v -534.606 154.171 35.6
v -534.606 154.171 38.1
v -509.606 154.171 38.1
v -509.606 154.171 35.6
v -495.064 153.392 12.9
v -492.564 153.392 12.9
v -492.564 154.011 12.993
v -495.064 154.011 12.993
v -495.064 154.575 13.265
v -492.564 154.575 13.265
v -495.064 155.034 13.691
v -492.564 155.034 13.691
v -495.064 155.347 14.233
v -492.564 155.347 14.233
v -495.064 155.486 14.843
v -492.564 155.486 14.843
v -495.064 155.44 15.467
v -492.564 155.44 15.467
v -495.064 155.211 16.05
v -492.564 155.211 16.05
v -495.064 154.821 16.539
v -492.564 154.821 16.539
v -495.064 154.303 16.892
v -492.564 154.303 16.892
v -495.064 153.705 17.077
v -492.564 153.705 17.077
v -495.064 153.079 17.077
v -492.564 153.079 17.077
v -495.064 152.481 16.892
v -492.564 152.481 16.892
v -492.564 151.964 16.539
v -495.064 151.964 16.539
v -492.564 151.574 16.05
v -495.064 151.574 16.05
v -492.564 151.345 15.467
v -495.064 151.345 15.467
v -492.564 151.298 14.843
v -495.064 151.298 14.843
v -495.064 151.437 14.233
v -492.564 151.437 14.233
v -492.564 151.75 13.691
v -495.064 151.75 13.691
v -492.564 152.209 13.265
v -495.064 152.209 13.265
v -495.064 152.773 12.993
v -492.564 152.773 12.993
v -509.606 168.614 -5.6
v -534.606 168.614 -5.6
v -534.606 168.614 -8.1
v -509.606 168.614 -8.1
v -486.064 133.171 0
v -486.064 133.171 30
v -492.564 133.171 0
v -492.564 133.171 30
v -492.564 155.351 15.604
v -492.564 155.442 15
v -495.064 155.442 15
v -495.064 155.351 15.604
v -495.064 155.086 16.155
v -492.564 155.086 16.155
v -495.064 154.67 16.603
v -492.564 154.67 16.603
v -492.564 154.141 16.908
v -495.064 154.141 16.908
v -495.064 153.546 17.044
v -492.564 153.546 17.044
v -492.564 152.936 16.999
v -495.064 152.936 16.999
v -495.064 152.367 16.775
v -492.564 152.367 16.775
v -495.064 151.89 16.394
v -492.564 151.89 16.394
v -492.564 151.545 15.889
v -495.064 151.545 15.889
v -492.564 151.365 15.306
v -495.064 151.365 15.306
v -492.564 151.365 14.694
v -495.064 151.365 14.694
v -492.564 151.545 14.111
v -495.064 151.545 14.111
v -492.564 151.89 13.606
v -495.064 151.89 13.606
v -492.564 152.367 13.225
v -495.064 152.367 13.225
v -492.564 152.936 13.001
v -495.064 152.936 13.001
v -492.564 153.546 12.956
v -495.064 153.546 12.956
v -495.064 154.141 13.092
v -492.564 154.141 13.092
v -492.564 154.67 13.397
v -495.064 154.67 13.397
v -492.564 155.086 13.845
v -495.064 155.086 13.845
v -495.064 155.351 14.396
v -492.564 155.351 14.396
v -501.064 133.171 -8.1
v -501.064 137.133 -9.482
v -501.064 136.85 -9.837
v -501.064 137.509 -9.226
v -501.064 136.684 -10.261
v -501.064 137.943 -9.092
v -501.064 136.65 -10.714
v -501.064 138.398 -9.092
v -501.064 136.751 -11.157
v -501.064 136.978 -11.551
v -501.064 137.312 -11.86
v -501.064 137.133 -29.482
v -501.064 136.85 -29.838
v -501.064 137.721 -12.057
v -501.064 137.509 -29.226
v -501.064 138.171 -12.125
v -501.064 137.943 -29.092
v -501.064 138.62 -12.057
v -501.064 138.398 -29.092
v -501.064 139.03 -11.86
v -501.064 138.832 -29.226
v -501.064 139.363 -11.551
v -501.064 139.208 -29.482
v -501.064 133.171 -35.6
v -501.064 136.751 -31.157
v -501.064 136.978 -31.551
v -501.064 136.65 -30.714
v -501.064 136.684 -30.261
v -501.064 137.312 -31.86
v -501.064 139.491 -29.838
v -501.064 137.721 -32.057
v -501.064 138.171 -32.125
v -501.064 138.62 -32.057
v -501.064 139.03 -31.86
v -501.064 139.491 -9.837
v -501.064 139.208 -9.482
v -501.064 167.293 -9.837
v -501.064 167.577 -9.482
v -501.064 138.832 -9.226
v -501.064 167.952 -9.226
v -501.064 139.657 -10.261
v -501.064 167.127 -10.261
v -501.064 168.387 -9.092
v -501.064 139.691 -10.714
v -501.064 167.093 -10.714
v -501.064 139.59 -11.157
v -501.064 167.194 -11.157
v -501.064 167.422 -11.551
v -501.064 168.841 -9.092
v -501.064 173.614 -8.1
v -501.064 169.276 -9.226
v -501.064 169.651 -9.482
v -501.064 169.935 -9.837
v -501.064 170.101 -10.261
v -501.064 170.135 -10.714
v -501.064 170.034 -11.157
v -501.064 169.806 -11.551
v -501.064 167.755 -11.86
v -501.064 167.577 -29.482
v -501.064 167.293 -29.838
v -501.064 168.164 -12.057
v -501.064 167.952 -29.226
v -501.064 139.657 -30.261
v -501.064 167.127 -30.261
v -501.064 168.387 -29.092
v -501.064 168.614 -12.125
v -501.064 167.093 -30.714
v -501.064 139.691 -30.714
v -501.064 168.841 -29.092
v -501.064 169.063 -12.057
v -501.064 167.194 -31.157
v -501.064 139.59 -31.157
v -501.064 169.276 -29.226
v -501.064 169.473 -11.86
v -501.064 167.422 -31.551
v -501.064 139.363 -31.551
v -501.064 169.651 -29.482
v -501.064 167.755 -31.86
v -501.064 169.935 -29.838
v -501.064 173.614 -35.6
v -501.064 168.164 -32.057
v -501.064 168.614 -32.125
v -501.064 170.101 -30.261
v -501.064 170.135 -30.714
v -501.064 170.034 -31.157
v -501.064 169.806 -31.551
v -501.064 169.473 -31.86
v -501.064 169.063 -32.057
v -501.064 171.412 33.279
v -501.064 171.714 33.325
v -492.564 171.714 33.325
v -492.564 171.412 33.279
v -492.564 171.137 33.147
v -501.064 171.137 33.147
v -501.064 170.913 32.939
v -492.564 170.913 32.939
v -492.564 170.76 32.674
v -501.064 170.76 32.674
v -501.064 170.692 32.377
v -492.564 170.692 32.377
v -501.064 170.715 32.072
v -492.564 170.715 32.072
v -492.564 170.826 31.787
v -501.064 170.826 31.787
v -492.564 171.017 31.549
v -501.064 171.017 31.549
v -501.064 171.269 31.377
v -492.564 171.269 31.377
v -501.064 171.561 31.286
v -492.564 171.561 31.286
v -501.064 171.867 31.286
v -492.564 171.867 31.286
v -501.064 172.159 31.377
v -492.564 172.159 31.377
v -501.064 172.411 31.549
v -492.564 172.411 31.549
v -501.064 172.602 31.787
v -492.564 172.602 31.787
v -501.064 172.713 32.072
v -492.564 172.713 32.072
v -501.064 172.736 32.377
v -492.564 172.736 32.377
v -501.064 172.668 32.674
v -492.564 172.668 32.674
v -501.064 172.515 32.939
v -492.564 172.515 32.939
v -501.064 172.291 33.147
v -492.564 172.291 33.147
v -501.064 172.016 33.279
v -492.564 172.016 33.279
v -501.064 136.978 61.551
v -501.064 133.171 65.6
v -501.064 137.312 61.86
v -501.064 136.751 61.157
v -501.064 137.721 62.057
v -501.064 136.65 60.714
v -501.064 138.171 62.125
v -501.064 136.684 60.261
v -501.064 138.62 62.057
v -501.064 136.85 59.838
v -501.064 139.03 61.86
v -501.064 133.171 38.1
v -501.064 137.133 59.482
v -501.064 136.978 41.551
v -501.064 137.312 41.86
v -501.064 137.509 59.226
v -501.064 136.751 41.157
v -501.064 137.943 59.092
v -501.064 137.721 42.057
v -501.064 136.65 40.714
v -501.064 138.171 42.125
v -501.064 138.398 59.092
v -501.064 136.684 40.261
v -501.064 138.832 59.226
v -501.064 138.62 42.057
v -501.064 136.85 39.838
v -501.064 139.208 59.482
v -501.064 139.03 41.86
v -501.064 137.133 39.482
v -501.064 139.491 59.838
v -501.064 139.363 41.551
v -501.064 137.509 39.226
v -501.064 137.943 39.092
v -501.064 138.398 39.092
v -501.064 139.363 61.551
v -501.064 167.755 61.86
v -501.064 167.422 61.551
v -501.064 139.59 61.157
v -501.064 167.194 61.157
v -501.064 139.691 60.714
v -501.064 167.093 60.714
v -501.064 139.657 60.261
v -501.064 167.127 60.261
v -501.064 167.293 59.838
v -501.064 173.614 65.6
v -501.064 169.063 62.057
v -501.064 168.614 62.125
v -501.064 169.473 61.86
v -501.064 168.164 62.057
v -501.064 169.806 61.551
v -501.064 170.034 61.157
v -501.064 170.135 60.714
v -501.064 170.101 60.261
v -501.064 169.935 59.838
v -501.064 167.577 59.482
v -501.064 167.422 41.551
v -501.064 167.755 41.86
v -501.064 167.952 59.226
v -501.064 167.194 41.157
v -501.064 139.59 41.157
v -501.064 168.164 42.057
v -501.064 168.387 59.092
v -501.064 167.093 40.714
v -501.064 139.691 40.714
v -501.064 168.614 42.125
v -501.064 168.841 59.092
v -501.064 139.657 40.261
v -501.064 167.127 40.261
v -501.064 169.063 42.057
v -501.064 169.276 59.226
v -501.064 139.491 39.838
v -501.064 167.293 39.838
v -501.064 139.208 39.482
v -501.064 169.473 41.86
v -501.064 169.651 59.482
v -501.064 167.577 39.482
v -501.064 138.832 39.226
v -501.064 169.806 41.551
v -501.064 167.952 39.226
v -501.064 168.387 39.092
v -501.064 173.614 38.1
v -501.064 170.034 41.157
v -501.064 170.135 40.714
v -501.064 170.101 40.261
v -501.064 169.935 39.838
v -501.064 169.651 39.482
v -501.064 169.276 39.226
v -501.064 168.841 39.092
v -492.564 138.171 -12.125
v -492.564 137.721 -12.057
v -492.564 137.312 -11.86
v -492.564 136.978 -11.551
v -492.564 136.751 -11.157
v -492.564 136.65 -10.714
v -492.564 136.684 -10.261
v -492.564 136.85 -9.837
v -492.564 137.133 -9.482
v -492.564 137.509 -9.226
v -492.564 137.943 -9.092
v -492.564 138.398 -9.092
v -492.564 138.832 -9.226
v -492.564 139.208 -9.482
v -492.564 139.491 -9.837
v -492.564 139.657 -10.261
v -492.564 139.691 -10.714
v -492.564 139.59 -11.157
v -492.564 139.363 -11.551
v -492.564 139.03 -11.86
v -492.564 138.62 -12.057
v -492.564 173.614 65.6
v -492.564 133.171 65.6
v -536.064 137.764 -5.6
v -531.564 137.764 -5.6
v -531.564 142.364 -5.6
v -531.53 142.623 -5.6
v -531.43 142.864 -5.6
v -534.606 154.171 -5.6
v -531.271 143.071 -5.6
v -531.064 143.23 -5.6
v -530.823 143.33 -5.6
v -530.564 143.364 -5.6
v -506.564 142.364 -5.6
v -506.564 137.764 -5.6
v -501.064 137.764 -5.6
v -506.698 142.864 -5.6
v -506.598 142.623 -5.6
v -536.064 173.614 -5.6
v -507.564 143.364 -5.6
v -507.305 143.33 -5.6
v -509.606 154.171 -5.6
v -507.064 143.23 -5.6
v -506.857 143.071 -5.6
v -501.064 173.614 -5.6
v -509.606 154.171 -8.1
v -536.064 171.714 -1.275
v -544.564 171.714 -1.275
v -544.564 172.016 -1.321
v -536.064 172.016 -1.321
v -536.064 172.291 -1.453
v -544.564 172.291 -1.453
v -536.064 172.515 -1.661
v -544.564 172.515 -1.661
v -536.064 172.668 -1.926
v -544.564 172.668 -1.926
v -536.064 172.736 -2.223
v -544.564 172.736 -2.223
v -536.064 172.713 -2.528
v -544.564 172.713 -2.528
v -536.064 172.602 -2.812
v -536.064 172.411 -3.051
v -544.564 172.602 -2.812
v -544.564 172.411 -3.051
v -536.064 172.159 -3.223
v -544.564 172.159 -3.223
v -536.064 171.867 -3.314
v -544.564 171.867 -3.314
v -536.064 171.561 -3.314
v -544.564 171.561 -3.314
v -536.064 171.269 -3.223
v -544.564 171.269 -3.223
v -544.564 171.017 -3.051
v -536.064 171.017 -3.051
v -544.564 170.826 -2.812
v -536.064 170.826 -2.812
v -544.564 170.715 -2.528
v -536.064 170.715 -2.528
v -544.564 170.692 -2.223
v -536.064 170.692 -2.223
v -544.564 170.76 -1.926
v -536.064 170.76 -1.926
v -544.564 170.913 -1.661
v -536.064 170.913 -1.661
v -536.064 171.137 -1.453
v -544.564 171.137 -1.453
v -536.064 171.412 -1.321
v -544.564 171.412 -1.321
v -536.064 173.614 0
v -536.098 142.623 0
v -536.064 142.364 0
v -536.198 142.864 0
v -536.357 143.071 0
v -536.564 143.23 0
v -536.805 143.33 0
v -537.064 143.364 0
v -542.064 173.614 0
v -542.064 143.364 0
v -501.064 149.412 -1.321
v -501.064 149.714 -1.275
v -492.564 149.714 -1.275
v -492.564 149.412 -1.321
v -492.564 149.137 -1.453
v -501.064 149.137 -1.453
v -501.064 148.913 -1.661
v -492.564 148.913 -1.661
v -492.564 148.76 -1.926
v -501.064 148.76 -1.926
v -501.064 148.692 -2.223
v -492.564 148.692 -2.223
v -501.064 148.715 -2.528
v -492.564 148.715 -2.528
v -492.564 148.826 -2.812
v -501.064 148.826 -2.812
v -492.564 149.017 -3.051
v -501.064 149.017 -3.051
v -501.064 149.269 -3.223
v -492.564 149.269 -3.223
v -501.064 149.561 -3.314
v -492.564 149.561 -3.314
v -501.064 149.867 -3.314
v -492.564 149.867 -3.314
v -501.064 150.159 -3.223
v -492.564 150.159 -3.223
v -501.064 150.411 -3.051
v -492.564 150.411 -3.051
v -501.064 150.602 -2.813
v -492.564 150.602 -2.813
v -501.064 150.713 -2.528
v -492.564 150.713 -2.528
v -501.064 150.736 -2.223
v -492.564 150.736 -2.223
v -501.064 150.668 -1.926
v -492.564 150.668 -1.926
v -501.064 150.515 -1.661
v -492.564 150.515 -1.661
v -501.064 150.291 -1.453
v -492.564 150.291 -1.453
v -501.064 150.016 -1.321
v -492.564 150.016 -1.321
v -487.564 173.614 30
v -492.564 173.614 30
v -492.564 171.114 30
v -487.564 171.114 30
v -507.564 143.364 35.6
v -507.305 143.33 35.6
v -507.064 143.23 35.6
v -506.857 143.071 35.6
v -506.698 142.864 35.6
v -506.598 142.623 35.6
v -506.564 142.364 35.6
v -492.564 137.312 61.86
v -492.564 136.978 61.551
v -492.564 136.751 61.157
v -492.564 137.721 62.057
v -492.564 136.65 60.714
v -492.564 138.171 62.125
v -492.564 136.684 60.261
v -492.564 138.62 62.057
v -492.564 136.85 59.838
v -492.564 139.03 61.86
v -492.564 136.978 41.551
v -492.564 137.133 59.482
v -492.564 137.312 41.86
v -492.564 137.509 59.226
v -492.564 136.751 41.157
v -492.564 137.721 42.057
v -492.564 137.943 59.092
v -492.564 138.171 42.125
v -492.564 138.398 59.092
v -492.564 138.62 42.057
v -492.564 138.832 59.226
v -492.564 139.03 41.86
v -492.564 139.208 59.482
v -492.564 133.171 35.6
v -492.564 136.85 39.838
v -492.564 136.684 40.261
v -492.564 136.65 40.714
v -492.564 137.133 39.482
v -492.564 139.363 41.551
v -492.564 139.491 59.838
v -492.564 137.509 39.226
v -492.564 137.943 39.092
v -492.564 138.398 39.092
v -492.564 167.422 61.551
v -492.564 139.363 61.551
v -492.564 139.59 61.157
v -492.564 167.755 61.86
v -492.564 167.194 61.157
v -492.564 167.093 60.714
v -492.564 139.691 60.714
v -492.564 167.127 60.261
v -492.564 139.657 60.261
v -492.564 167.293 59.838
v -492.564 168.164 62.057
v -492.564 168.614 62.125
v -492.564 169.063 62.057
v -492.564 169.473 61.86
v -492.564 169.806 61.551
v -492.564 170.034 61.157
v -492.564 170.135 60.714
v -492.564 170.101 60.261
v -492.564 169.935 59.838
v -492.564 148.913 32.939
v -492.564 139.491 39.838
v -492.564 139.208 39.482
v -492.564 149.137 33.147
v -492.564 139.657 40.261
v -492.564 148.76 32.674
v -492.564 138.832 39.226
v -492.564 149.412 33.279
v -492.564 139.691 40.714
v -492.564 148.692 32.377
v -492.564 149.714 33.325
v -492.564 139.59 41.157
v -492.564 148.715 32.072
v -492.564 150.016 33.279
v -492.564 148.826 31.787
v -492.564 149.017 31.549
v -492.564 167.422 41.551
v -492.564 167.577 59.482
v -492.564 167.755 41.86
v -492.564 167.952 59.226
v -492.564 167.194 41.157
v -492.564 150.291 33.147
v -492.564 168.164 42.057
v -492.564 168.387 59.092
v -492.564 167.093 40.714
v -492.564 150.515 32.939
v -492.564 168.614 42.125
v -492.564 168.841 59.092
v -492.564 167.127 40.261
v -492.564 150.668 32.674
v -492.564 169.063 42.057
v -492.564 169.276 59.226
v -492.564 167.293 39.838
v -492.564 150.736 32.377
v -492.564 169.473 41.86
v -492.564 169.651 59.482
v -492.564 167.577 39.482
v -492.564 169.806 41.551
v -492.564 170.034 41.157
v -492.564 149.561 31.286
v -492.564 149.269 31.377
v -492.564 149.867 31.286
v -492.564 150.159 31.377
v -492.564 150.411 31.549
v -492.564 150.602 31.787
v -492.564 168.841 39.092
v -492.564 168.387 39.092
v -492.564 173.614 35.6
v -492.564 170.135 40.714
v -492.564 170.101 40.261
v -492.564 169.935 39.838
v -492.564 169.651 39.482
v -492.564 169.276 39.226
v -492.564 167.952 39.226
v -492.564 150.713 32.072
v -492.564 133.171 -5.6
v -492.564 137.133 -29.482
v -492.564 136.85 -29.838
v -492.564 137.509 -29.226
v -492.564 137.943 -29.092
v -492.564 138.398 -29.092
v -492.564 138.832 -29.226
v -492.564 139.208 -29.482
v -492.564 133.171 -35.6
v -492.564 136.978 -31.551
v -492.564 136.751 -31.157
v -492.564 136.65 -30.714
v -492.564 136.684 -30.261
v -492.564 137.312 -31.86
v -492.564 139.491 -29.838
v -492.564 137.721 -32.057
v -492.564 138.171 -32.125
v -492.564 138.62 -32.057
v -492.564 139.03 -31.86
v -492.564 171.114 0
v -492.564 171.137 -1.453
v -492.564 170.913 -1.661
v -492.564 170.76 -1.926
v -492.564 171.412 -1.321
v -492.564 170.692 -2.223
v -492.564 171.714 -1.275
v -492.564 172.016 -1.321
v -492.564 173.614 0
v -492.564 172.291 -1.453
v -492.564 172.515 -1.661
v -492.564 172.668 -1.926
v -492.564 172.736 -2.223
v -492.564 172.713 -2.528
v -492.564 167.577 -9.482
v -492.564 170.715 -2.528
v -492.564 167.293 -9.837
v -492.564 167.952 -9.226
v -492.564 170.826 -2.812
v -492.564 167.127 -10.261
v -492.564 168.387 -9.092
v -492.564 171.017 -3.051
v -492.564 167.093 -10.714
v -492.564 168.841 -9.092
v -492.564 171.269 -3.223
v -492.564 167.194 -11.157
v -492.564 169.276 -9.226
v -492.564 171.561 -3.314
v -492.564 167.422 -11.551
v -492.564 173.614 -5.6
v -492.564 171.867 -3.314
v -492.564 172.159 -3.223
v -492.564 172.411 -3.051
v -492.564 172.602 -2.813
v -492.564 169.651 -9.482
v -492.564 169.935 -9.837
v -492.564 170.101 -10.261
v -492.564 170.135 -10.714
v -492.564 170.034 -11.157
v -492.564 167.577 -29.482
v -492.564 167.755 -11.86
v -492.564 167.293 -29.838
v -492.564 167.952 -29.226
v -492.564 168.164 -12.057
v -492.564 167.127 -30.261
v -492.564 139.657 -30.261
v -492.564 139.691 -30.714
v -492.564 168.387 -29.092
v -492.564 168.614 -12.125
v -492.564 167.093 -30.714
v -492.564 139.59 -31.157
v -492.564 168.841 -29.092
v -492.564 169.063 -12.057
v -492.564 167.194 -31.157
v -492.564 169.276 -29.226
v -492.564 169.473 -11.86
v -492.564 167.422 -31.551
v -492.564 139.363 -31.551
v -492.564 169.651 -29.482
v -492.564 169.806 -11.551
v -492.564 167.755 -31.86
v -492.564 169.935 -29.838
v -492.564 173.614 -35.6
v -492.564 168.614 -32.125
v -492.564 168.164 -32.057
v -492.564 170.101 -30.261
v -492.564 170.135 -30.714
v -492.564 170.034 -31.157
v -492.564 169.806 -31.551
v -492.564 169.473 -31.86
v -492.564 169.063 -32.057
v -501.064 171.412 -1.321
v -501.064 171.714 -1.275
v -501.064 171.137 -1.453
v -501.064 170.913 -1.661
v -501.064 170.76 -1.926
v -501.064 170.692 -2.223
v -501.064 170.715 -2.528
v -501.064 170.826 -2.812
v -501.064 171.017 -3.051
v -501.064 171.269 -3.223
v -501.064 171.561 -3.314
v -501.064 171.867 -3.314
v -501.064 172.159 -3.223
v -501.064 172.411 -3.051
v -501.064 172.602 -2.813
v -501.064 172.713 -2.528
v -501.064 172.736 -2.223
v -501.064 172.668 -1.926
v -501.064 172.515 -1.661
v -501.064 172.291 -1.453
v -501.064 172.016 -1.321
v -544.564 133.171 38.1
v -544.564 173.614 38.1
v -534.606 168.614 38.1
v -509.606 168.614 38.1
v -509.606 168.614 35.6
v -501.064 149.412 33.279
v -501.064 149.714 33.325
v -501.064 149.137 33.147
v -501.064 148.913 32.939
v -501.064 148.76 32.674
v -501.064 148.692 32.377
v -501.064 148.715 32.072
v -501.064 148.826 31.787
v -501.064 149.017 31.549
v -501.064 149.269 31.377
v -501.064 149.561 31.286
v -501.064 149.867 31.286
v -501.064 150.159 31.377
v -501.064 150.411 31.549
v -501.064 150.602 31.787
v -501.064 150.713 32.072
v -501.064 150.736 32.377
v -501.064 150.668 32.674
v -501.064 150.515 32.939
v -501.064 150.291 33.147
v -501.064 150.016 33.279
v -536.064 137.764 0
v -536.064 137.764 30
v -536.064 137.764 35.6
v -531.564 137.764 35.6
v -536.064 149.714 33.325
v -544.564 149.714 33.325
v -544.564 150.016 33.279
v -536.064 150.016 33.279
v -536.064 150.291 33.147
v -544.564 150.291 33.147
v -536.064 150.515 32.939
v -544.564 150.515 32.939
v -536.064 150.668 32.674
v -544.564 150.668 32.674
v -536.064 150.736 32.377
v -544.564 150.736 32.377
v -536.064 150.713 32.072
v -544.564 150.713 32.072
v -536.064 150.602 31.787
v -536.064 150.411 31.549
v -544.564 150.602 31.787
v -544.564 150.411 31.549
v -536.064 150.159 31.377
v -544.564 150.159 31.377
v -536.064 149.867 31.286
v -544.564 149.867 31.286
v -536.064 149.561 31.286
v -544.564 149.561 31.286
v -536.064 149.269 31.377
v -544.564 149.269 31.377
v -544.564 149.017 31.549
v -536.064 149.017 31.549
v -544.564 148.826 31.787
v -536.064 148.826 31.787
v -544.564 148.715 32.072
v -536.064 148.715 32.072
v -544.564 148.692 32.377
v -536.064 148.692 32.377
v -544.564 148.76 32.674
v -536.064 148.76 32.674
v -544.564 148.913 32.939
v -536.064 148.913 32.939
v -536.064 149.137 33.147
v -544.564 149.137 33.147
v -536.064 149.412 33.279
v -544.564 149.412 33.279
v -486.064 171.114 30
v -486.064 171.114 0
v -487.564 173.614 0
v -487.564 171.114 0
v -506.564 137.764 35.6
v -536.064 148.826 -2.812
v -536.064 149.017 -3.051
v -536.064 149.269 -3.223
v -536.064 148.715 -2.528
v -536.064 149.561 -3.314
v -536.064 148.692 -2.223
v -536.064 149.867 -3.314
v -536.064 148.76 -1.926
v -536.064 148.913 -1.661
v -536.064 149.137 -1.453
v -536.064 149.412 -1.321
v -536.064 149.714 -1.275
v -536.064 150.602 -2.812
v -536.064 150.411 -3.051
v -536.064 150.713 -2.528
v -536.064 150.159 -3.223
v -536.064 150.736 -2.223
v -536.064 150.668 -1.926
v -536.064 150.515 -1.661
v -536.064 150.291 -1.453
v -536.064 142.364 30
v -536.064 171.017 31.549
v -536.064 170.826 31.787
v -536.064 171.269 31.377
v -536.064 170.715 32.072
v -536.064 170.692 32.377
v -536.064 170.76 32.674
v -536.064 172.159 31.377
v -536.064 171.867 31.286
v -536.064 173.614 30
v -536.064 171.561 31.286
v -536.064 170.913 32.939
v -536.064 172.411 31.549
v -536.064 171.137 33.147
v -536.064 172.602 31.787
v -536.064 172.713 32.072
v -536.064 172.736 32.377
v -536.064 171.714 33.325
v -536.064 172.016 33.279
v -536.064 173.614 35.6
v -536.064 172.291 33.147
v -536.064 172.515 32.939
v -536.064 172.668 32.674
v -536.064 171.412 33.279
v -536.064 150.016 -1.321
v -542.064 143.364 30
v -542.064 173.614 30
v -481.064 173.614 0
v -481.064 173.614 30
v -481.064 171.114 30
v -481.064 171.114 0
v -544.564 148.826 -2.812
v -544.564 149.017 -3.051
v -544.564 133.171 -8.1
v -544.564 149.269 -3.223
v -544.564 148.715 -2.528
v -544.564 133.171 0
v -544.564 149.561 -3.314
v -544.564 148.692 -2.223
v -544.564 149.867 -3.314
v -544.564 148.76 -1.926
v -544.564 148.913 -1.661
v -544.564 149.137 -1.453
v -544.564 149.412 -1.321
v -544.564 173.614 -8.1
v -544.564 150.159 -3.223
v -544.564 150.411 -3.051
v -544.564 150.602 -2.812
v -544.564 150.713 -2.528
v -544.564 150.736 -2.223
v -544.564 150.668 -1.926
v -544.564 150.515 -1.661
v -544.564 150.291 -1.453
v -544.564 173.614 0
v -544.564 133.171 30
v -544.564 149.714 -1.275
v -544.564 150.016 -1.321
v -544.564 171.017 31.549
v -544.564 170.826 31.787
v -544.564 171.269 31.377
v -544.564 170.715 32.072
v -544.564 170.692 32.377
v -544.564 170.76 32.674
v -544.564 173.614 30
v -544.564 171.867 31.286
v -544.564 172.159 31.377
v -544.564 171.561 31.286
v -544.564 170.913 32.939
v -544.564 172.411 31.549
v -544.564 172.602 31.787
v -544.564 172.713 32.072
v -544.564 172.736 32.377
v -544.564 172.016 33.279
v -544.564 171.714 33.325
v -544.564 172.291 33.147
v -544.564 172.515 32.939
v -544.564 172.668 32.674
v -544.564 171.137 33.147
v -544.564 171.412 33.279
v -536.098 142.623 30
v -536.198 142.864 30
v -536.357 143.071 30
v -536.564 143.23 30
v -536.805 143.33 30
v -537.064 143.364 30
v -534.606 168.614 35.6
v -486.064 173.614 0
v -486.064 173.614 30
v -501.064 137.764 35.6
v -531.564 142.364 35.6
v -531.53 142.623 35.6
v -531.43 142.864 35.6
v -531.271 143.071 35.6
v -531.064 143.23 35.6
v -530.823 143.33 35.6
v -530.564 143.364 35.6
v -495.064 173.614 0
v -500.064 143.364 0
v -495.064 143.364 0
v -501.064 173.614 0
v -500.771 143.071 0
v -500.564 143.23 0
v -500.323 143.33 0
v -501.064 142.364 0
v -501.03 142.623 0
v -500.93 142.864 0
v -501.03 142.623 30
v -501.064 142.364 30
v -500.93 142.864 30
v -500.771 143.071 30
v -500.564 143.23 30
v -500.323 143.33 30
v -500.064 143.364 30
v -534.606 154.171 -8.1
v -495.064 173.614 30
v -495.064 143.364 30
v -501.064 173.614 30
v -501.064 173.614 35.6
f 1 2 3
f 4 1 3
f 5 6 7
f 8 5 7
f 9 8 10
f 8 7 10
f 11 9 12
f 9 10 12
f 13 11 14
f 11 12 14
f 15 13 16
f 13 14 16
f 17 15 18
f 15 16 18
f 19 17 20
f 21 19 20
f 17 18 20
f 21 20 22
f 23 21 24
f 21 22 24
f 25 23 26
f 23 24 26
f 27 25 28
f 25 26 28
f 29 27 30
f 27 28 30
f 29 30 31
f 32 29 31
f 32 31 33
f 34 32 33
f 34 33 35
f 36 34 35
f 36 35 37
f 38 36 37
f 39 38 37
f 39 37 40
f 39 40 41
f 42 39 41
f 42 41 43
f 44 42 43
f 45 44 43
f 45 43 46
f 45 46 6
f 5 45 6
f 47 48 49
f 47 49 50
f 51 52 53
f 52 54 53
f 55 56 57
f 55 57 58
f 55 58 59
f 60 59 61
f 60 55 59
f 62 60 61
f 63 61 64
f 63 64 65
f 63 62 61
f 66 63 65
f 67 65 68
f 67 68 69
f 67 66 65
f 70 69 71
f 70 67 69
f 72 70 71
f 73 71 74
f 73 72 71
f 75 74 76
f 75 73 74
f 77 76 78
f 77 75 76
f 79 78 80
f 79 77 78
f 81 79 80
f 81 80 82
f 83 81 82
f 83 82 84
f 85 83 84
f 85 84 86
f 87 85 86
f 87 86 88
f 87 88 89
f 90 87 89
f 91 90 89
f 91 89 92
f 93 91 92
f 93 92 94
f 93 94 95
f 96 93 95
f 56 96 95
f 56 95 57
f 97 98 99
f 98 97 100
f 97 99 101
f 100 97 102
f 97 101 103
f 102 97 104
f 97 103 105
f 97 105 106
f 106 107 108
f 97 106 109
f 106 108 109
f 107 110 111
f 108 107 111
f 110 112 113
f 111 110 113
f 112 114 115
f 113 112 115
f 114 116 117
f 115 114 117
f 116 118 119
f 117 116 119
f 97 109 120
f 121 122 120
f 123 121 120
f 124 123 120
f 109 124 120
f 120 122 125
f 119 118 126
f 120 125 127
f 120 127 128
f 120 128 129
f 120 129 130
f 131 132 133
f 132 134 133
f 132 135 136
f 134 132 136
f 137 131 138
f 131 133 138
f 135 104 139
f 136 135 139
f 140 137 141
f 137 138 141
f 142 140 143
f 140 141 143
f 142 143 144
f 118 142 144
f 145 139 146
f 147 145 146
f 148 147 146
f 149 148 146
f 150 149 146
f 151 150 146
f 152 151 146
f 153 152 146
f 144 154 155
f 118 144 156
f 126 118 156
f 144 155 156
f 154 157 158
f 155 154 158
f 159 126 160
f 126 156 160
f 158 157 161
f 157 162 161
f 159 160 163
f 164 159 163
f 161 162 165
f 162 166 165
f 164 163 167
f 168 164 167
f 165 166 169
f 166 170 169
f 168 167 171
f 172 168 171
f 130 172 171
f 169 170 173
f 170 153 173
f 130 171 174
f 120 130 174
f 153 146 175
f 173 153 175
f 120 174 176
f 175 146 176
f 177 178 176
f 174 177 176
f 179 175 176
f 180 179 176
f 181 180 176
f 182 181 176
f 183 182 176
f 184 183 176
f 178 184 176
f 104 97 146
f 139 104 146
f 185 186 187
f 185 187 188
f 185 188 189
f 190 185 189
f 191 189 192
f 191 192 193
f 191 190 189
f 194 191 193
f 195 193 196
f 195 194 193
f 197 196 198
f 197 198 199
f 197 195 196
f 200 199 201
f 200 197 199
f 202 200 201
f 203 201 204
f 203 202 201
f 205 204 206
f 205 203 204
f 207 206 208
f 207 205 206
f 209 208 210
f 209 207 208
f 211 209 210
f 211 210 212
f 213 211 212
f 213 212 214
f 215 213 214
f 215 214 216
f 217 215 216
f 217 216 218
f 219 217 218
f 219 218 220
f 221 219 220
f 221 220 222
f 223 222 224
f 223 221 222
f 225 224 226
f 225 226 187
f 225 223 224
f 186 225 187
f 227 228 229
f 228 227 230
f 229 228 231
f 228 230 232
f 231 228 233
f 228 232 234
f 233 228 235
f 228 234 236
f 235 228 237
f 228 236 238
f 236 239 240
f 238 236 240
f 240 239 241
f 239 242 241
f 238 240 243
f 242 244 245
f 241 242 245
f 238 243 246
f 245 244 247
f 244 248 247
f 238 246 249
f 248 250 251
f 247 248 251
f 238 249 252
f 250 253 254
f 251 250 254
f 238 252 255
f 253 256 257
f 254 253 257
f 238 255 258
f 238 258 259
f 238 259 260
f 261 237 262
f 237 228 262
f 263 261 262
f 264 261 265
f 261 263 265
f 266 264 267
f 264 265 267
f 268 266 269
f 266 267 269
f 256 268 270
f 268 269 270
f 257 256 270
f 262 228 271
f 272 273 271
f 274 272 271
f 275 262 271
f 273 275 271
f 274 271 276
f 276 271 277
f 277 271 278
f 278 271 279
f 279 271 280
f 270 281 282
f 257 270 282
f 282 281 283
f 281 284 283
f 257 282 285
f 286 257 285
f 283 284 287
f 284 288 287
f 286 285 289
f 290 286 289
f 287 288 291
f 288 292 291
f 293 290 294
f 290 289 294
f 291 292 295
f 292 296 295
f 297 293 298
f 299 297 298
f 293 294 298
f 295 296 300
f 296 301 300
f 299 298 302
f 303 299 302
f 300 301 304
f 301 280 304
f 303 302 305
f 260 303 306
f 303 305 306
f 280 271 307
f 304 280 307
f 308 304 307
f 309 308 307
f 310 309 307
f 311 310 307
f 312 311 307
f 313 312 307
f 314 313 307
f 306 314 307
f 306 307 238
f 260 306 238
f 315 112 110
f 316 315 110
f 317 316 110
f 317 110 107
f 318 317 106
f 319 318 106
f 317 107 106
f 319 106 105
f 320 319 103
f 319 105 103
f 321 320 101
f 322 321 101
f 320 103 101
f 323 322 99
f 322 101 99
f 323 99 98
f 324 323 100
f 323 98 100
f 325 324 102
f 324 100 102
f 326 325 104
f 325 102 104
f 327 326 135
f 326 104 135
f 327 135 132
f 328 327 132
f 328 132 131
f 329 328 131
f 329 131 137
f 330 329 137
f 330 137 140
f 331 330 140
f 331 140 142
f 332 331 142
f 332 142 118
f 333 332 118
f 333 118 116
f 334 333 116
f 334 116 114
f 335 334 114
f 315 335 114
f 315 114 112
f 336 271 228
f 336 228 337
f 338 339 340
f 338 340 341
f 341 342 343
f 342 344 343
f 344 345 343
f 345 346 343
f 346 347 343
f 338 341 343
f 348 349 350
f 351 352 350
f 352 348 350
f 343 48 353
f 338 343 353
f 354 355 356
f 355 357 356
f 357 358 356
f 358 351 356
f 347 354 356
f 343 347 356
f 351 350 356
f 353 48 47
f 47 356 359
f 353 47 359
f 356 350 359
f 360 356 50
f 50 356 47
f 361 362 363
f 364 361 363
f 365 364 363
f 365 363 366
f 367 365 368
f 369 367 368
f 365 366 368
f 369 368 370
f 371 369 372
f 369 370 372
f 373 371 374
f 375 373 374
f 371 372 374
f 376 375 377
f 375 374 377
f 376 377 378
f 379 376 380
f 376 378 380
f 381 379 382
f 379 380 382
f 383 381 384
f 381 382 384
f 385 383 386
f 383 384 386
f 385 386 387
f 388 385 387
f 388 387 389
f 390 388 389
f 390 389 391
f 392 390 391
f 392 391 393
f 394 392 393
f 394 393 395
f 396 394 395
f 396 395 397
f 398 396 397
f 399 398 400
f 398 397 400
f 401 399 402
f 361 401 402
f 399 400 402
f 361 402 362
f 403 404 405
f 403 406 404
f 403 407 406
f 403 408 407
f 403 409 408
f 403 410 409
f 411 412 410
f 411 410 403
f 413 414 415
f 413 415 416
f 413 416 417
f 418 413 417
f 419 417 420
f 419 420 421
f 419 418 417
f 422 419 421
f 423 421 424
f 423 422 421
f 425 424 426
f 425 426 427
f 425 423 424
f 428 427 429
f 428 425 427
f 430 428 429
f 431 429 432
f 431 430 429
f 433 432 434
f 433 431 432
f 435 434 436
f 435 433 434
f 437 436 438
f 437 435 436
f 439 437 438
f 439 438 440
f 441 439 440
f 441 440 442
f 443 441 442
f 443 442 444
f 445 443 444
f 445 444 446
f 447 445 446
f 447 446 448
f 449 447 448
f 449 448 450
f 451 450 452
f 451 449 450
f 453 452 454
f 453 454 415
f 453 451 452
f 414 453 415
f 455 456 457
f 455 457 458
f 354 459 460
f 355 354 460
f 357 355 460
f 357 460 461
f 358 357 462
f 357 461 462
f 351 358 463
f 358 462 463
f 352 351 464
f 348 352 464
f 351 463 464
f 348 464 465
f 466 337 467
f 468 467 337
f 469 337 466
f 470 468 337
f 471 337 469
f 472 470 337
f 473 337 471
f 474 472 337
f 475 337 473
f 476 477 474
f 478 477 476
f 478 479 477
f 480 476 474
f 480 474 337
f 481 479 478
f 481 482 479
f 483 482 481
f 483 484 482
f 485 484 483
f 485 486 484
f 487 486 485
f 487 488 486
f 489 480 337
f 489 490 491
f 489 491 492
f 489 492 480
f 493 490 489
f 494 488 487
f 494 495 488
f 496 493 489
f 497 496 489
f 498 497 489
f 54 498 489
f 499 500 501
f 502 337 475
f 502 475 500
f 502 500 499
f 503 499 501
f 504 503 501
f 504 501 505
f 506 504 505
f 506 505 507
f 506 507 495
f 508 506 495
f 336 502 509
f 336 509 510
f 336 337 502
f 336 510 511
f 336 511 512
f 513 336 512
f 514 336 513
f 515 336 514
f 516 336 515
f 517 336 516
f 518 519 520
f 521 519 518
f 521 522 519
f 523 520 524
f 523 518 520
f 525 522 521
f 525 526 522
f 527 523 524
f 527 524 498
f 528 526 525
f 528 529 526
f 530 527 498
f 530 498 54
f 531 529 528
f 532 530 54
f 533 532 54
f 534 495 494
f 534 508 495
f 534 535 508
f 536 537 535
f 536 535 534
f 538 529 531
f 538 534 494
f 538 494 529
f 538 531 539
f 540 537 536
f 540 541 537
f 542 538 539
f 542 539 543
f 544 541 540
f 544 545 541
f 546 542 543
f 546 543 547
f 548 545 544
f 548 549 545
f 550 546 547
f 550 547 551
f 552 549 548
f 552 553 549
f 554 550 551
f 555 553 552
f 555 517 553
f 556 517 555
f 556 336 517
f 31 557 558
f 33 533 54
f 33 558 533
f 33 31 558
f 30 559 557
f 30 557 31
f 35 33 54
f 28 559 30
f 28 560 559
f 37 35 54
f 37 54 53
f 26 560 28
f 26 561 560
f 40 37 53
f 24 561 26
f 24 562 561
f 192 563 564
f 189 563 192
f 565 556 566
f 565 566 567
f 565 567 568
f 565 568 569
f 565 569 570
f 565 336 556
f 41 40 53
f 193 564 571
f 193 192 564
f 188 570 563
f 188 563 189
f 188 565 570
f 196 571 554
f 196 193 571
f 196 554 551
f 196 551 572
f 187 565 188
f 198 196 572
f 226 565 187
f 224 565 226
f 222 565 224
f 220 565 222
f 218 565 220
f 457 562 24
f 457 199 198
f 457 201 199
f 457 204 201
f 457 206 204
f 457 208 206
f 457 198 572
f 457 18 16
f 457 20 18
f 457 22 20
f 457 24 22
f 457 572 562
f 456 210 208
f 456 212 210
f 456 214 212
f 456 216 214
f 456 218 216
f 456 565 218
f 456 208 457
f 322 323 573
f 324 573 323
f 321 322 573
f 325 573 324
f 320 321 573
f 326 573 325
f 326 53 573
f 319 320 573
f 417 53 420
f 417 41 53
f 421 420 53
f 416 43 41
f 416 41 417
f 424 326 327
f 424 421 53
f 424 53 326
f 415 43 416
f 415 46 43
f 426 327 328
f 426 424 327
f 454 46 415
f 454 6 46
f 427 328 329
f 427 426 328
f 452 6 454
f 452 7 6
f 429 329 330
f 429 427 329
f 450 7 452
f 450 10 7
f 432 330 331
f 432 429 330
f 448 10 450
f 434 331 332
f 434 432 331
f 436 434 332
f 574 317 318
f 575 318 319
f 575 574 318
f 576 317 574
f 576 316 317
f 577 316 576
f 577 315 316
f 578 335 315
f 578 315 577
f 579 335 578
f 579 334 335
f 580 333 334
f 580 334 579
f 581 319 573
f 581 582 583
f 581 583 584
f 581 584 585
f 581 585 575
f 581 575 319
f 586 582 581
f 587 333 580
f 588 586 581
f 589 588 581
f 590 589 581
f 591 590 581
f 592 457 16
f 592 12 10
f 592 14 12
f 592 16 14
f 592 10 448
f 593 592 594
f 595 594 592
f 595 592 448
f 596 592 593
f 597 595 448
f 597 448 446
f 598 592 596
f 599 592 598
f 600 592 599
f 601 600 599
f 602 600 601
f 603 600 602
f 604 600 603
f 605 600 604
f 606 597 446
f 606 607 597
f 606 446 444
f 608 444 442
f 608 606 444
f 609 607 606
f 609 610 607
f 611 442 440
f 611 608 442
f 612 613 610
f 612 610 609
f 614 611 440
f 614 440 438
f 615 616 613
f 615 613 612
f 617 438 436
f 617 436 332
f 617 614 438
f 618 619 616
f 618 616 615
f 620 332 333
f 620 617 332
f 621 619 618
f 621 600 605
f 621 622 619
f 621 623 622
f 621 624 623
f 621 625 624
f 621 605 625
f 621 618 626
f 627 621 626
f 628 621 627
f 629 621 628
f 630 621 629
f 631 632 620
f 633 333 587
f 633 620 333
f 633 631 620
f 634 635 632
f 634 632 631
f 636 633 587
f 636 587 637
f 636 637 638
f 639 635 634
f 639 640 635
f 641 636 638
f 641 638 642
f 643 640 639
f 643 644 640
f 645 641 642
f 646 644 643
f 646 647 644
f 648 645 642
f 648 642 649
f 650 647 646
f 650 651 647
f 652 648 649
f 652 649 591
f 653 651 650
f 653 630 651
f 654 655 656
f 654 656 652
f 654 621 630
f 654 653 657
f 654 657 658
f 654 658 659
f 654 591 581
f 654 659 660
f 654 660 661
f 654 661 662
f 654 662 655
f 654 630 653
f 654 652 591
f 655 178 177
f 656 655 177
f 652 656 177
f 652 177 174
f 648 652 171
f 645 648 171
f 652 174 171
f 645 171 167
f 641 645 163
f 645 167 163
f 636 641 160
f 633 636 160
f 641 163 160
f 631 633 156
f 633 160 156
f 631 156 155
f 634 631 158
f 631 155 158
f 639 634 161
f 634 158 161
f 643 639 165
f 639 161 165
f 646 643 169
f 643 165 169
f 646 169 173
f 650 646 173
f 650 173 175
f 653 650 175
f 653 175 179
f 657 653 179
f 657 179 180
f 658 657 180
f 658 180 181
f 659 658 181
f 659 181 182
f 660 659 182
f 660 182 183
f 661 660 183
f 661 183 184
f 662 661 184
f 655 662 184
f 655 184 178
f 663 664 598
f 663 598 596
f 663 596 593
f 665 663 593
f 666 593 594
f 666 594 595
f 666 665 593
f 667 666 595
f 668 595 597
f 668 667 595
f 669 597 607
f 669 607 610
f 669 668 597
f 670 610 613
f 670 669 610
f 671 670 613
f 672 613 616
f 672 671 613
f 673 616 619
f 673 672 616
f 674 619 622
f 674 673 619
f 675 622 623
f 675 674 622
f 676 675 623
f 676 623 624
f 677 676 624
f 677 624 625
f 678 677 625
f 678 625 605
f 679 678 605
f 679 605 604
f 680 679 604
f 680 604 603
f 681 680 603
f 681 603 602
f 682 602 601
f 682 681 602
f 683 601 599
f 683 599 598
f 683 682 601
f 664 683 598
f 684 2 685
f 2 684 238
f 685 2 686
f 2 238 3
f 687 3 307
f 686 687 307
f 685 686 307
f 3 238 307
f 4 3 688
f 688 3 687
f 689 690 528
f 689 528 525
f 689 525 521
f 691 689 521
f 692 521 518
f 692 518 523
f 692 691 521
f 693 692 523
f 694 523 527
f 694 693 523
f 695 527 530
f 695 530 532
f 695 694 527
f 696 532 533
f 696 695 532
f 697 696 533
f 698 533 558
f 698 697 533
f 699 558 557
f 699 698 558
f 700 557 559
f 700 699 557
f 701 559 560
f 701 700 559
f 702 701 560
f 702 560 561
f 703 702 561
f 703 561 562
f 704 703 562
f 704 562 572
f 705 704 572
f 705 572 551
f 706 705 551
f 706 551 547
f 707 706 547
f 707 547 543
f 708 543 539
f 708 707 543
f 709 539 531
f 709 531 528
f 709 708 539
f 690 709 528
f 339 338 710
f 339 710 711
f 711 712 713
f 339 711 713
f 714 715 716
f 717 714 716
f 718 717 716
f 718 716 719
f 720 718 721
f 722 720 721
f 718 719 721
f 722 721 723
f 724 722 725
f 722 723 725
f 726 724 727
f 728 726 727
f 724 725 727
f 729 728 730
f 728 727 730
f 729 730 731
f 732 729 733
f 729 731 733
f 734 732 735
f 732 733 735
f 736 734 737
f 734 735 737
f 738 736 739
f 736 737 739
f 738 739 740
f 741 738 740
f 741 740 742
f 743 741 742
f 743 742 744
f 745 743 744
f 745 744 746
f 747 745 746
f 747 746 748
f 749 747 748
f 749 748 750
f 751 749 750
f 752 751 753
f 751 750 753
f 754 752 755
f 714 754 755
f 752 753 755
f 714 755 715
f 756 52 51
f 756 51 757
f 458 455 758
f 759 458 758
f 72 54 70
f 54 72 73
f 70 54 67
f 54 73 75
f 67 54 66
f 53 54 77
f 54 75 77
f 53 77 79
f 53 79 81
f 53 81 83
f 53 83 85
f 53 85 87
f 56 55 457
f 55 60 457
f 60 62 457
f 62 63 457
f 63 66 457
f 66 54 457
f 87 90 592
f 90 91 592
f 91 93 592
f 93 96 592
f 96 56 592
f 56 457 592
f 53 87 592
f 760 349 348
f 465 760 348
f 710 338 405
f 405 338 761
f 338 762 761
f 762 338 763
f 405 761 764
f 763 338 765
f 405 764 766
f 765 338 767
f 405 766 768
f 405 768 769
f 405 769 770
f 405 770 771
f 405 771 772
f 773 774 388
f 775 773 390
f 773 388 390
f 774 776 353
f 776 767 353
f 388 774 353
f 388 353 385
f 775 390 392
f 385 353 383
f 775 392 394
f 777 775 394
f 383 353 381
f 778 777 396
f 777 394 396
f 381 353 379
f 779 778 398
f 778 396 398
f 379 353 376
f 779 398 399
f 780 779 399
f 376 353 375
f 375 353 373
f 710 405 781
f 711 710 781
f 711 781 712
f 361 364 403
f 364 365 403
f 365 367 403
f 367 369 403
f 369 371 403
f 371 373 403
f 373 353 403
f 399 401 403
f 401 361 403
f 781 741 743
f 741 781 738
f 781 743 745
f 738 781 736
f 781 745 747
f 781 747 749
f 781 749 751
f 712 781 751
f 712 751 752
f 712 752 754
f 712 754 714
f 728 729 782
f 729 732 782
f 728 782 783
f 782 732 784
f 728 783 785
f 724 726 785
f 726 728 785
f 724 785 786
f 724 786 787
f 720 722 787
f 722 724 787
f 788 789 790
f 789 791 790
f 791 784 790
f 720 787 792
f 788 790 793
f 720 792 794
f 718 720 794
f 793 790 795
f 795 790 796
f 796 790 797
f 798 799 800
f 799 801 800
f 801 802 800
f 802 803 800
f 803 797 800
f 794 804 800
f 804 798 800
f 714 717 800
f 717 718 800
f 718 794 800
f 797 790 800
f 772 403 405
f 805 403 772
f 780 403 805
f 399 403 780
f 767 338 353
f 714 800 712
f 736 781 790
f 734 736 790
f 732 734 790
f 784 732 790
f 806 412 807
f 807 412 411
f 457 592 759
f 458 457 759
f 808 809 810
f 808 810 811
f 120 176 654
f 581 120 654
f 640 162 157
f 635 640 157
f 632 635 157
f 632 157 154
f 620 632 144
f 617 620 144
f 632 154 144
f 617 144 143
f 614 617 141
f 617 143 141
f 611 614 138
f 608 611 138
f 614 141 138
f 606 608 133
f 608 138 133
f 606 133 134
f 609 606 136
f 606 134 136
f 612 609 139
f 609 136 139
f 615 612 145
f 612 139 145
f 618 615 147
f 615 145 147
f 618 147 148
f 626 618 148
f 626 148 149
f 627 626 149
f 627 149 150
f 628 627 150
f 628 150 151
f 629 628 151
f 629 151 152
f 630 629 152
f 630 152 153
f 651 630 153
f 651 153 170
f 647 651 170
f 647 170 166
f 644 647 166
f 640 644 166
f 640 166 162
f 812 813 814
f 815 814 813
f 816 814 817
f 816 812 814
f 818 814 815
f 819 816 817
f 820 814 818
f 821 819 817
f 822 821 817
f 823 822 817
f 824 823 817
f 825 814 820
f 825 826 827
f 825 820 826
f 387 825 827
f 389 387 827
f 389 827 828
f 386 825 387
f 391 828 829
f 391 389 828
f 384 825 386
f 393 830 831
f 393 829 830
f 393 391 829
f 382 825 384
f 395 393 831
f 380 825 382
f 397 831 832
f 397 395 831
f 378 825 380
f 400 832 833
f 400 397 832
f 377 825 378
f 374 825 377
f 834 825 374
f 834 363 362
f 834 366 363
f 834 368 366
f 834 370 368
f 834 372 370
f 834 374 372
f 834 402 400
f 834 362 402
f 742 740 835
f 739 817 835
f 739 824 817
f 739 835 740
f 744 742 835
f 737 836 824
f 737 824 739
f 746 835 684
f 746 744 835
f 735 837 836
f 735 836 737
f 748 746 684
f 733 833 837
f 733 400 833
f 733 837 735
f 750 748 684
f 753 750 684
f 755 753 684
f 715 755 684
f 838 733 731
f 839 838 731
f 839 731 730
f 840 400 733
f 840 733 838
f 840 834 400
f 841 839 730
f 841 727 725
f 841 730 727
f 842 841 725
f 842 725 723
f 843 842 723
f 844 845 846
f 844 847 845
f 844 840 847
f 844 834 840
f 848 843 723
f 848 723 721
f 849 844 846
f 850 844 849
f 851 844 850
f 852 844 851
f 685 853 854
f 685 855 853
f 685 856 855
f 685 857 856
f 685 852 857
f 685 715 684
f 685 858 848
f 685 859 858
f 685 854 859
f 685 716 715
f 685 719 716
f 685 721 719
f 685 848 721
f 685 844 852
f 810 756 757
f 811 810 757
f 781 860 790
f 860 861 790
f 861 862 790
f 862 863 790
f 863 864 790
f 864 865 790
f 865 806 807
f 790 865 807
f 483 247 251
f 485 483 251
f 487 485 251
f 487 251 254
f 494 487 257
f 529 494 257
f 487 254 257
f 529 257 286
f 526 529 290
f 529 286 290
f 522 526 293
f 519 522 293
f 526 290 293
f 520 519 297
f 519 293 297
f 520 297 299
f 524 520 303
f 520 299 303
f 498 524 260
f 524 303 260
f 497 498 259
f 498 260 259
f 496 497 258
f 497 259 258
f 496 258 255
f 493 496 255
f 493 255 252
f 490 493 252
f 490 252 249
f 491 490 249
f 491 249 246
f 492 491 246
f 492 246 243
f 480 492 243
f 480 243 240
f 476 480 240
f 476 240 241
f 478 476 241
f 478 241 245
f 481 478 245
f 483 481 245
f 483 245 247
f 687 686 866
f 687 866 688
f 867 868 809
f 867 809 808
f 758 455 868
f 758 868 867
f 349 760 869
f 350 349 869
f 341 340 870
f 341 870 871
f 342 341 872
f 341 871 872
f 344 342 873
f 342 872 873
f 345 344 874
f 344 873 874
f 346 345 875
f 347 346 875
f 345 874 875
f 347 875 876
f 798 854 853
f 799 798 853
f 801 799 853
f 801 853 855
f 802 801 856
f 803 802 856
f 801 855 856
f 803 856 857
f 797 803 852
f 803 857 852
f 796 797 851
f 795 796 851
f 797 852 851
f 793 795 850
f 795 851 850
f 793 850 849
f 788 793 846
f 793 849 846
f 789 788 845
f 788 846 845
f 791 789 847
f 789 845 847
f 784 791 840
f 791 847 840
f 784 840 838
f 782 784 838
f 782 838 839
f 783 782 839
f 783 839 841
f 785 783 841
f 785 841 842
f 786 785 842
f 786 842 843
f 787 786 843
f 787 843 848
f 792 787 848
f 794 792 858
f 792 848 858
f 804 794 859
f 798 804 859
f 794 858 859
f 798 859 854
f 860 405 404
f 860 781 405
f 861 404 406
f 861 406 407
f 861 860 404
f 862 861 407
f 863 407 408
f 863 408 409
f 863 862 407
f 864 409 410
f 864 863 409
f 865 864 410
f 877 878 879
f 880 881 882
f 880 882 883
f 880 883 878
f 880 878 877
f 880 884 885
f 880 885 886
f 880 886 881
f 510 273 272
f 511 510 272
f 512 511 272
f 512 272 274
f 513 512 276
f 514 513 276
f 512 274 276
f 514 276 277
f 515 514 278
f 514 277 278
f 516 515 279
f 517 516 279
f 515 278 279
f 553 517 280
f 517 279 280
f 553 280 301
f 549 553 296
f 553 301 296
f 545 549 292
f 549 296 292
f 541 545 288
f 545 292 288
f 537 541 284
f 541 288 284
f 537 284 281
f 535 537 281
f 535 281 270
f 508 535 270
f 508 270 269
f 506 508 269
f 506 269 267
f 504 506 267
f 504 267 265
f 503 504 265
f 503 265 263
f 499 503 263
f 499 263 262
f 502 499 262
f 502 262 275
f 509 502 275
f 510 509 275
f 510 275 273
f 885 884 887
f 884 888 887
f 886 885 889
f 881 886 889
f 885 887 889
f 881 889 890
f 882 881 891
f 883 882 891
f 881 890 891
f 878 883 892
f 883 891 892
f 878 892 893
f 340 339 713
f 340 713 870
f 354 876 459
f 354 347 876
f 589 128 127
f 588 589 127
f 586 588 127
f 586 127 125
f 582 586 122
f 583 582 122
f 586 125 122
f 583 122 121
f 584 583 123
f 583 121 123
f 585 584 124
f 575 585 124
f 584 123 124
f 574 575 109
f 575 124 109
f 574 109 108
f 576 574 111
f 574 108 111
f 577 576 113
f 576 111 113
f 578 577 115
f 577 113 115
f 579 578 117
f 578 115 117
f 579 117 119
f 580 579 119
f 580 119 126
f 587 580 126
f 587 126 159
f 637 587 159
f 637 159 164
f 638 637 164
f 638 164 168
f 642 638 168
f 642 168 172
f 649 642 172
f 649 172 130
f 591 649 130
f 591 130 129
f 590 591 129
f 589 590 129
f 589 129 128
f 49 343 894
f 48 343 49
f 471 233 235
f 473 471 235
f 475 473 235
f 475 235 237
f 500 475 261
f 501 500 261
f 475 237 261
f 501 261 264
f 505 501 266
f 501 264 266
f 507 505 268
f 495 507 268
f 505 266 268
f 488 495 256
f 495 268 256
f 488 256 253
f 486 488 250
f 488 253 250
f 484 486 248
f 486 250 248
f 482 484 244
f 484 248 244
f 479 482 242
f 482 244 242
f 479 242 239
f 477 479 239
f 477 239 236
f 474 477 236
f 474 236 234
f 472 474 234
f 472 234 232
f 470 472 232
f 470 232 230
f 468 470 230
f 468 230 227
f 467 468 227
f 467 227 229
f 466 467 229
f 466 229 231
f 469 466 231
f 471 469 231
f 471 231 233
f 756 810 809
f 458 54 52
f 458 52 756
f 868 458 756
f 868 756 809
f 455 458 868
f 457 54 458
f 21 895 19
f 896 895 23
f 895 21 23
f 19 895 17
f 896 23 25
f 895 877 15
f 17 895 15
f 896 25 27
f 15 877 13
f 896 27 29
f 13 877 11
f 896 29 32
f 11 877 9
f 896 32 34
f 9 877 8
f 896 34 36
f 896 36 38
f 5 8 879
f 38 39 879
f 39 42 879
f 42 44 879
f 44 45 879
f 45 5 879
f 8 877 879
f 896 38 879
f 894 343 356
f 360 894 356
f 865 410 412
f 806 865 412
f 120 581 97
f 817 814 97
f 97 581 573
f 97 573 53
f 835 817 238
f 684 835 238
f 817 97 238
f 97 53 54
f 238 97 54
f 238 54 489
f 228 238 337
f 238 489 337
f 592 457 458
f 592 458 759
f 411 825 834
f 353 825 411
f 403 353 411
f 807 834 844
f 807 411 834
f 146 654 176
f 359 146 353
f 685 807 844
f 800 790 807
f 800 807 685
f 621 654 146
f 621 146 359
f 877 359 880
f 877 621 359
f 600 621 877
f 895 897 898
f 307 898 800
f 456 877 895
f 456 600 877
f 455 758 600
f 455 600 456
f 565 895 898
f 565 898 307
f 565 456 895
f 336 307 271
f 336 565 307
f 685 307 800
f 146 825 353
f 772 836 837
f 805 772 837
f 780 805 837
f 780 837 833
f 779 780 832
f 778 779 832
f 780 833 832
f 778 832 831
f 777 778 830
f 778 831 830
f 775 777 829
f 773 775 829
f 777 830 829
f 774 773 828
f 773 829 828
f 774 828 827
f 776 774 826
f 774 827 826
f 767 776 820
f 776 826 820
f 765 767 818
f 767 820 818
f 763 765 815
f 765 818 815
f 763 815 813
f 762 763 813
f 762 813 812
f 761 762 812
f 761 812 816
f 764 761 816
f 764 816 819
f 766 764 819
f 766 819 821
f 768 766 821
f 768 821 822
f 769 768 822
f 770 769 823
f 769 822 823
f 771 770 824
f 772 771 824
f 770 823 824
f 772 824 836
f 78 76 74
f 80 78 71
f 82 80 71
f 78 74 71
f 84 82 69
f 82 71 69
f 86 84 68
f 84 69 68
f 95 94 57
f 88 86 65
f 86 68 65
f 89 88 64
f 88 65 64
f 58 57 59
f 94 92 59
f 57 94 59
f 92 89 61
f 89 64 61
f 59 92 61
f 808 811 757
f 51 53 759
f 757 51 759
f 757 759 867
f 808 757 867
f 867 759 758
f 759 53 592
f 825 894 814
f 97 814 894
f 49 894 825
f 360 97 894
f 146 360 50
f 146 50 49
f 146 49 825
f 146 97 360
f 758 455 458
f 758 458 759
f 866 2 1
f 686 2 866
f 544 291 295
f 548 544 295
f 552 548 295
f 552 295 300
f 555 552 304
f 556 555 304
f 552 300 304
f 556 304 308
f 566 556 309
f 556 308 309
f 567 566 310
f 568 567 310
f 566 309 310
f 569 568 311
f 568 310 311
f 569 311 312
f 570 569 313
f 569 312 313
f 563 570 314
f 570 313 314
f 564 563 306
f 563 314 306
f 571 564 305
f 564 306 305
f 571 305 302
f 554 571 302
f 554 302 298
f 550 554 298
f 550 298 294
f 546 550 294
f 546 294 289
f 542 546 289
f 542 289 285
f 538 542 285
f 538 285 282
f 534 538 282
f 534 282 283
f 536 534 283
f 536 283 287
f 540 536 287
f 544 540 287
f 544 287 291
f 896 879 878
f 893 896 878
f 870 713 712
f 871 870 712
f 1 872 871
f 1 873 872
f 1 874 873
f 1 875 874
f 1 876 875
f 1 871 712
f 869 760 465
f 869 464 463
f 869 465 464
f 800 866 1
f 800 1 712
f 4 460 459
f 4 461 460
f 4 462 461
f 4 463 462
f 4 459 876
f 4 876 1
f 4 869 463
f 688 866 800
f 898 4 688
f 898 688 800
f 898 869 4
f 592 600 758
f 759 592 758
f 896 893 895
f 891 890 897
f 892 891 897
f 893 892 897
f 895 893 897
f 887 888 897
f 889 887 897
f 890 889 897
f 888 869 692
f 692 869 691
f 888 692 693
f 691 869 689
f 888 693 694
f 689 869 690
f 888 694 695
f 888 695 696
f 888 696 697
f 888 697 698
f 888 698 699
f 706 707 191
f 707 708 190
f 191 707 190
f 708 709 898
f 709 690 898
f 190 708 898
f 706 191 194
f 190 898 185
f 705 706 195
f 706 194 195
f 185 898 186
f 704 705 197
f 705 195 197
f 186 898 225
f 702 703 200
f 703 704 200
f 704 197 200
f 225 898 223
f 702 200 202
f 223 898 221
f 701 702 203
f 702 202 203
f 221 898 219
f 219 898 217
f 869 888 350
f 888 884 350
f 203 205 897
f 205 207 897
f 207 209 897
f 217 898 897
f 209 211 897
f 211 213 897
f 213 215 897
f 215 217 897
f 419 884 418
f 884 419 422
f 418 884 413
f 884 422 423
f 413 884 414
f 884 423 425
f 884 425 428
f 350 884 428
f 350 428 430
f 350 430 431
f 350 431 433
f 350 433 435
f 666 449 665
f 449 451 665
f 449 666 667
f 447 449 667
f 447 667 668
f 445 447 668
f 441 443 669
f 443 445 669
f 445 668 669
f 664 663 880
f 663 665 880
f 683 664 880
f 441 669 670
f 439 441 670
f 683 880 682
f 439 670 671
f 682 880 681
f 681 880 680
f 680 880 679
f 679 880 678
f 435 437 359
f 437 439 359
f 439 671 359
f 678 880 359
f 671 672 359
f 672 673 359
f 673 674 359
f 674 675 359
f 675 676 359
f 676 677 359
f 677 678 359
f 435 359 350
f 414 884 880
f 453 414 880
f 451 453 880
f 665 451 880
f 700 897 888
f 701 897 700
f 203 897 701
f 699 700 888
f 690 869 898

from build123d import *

# Parameters (mm, degrees)
BOSS_EXTRUDE1_DEPTH  = 30
SKETCH2_W            = 5.6
SKETCH2_H            = 40.443252471
SKETCH2_R            = 1.025
BOSS_EXTRUDE2_DEPTH  = 8.5
SKETCH4_W            = 25
SKETCH4_H            = 10.193252471
BOSS_EXTRUDE3_DEPTH  = 5.6
SKETCH5_W            = 25
SKETCH5_H            = 10.193252471
BOSS_EXTRUDE4_DEPTH  = 5.6
FILLET2_R            = 1
BOSS_EXTRUDE5_START  = -8.5
SKETCH6_W            = 5.6
SKETCH6_H            = 40.443252471
SKETCH6_R            = 1.025
BOSS_EXTRUDE5_DEPTH  = 8.5
FILLET3_R            = 1
SKETCH8_R            = 2.1
CUT_EXTRUDE1_DEPTH   = 8.5
SKETCH9_W            = 8.5
SKETCH9_H            = 30
BOSS_EXTRUDE6_DEPTH  = 40.443252471
SKETCH10_R           = 1.525
CUT_EXTRUDE2_DEPTH   = 191.623742611
SKETCH11_W           = 5
SKETCH11_H           = 30
BOSS_EXTRUDE7_DEPTH  = 2.5
SKETCH12_W           = 30
SKETCH12_H           = 37.943252471
BOSS_EXTRUDE8_DEPTH  = 5
SKETCH13_W           = 30
SKETCH13_H           = 40.443252471
BOSS_EXTRUDE9_DEPTH  = 1.5
SKETCH15_W           = 30
SKETCH15_H           = 2.5
BOSS_EXTRUDE10_DEPTH = 5
SKETCH17_W           = 2.5
SKETCH17_H           = 40.443252471
BOSS_EXTRUDE11_DEPTH = 43.500000004
SKETCH18_W           = 25
SKETCH18_H           = 14.443252471
CUT_EXTRUDE5_DEPTH   = 60
SKETCH19_W           = 43.500000004
SKETCH19_H           = 46.2
BOSS_EXTRUDE12_DEPTH = 4.593252471
SKETCH22_R           = 2.05
BOSS_EXTRUDE15_DEPTH = 9


with BuildPart() as part:
    # Sketch1 → Boss-Extrude1 (new body)
    with BuildSketch(Plane.XY):
        Polygon((-492.563683395, 133.170690652), (-492.563683395, 173.613943123), (-495.063683395, 173.613943123), (-495.063683395, 143.363943123), (-501.063683395, 143.363943123), (-501.063683395, 137.763943123), (-506.563683395, 137.763943123), (-506.563683395, 143.363943123), (-519.063683395, 143.363943123), (-531.563683395, 143.363943123), (-531.563683395, 137.763943123), (-536.063683395, 137.763943123), (-536.063683395, 143.363943123), (-542.063683399, 143.363943123), (-542.063683399, 173.613943123), (-544.563683399, 173.613943123), (-544.563683399, 133.170690652), align=None)
    extrude(amount=BOSS_EXTRUDE1_DEPTH)

    # Sketch2 → Boss-Extrude2 (add)
    # profile 1 of 2: a face of its own
    with BuildSketch(Plane.ZY.offset(544.563683399)):
        with Locations((-2.8, 153.392316888)):
            Rectangle(SKETCH2_W, SKETCH2_H)
        with Locations((-2.3, 171.713943123)):
            Circle(SKETCH2_R, mode=Mode.SUBTRACT)
        with Locations((-2.3, 149.713943123)):
            Circle(SKETCH2_R, mode=Mode.SUBTRACT)
    # profile 2 of 2: a face of its own
    with BuildSketch(Plane.ZY.offset(544.563683399)):
        with Locations((32.8, 153.392316888)):
            Rectangle(SKETCH2_W, SKETCH2_H)
        with Locations((32.3, 149.713943123)):
            Circle(SKETCH2_R, mode=Mode.SUBTRACT)
        with Locations((32.3, 171.713943123)):
            Circle(SKETCH2_R, mode=Mode.SUBTRACT)
    extrude(amount=-BOSS_EXTRUDE2_DEPTH)

    # Sketch4 → Boss-Extrude3 (add)
    with BuildSketch(Plane(origin=(0, 0, 0), x_dir=(-1, 0, 0), z_dir=(0, 0, -1))):
        with Locations((519.063683395, 138.267316888)):
            Rectangle(SKETCH4_W, SKETCH4_H)
    extrude(amount=BOSS_EXTRUDE3_DEPTH)

    # Sketch5 → Boss-Extrude4 (add)
    with BuildSketch(Plane.XY.offset(30)):
        with Locations((-519.063683395, 138.267316888)):
            Rectangle(SKETCH5_W, SKETCH5_H)
    extrude(amount=BOSS_EXTRUDE4_DEPTH)

    # Fillet2
    fillet2_edges = [part.edges().sort_by_distance(p)[0] for p in [
        (-531.563683395, 143.363943123, 15),
        (-506.563683395, 143.363943123, 15),
    ]]
    fillet(fillet2_edges, radius=FILLET2_R)

    # Sketch6 → Boss-Extrude5 (add)
    # profile 1 of 2: a face of its own
    with BuildSketch(Plane(origin=(-492.563683395, 0, 0), x_dir=(0, 0, -1), z_dir=(1, 0, 0)).offset(BOSS_EXTRUDE5_START)):
        with Locations((-32.8, 153.392316888)):
            Rectangle(SKETCH6_W, SKETCH6_H)
        with Locations(Location((-32.3, 171.713943123, 0), (0, 0, 180))):
            Circle(SKETCH6_R, mode=Mode.SUBTRACT)
        with Locations(Location((-32.3, 149.713943123, 0), (0, 0, 180))):
            Circle(SKETCH6_R, mode=Mode.SUBTRACT)
    # profile 2 of 2: a face of its own
    with BuildSketch(Plane(origin=(-492.563683395, 0, 0), x_dir=(0, 0, -1), z_dir=(1, 0, 0)).offset(BOSS_EXTRUDE5_START)):
        with Locations((2.8, 153.392316888)):
            Rectangle(SKETCH6_W, SKETCH6_H)
        with Locations(Location((2.3, 171.713943123, 0), (0, 0, 180))):
            Circle(SKETCH6_R, mode=Mode.SUBTRACT)
        with Locations(Location((2.3, 149.713943123, 0), (0, 0, 180))):
            Circle(SKETCH6_R, mode=Mode.SUBTRACT)
    extrude(amount=BOSS_EXTRUDE5_DEPTH)

    # Fillet3
    fillet3_edges = [part.edges().sort_by_distance(p)[0] for p in [
        (-536.063683395, 143.363943123, 15),
        (-501.063683395, 143.363943123, 15),
    ]]
    fillet(fillet3_edges, radius=FILLET3_R)

    # Sketch8 → Cut-Extrude1 (cut)
    with BuildSketch(Plane(origin=(-492.563683395, 0, 0), x_dir=(0, 0, -1), z_dir=(1, 0, 0))):
        with Locations((-15, 153.392316887)):
            Circle(SKETCH8_R)
    extrude(amount=-CUT_EXTRUDE1_DEPTH, mode=Mode.SUBTRACT)

    # Sketch9 → Boss-Extrude6 (add)
    with BuildSketch(Plane(origin=(0, 173.613943123, 0), x_dir=(1, 0, 0), z_dir=(0, 1, 0))):
        with Locations((-496.813683395, 20.6)):
            Rectangle(SKETCH9_W, SKETCH9_H)
        with Locations((-496.813683395, -50.6)):
            Rectangle(SKETCH9_W, SKETCH9_H)
    extrude(amount=-BOSS_EXTRUDE6_DEPTH)

    # Sketch10 → Cut-Extrude2 (cut, through all)
    with BuildSketch(Plane.ZY.offset(501.063683395)):
        with Locations((40.6, 168.613943123)):
            Circle(SKETCH10_R)
        with Locations((60.6, 168.613943123)):
            Circle(SKETCH10_R)
        with Locations((60.6, 138.170690652)):
            Circle(SKETCH10_R)
        with Locations((40.6, 138.170690652)):
            Circle(SKETCH10_R)
        with Locations(Location((-30.6, 168.613943123, 0), (0, 0, 180))):
            Circle(SKETCH10_R)
        with Locations(Location((-30.6, 138.170690652, 0), (0, 0, 180))):
            Circle(SKETCH10_R)
        with Locations(Location((-10.6, 138.170690652, 0), (0, 0, 180))):
            Circle(SKETCH10_R)
        with Locations(Location((-10.6, 168.613943123, 0), (0, 0, 180))):
            Circle(SKETCH10_R)
    extrude(amount=-CUT_EXTRUDE2_DEPTH, mode=Mode.SUBTRACT)

    # Sketch11 → Boss-Extrude7 (add)
    with BuildSketch(Plane(origin=(0, 173.613943123, 0), x_dir=(1, 0, 0), z_dir=(0, 1, 0))):
        with Locations((-490.063683395, -15)):
            Rectangle(SKETCH11_W, SKETCH11_H)
    extrude(amount=-BOSS_EXTRUDE7_DEPTH)

    # Sketch17 → Boss-Extrude11 (add)
    with BuildSketch(Plane.ZY.offset(501.063683395)):
        with Locations((36.85, 153.392316888)):
            Rectangle(SKETCH17_W, SKETCH17_H)
        with Locations((-6.85, 153.392316888)):
            Rectangle(SKETCH17_W, SKETCH17_H)
    extrude(amount=BOSS_EXTRUDE11_DEPTH)

    # Sketch18 → Cut-Extrude5 (cut)
    with BuildSketch(Plane.XY.offset(38.1)):
        with Locations((-522.105650898, 161.392316888)):
            Rectangle(SKETCH18_W, SKETCH18_H)
    extrude(amount=-CUT_EXTRUDE5_DEPTH, mode=Mode.SUBTRACT)

    # Sketch19 → Boss-Extrude12 (add)
    with BuildSketch(Plane.XZ.offset(-133.170690652)):
        with Locations((-522.813683397, 15)):
            Rectangle(SKETCH19_W, SKETCH19_H)
    extrude(amount=-BOSS_EXTRUDE12_DEPTH)


with BuildPart() as body_2:
    # Sketch12 → Boss-Extrude8 (new body)
    with BuildSketch(Plane(origin=(-492.563683395, 0, 0), x_dir=(0, 0, -1), z_dir=(1, 0, 0))):
        with Locations((-15, 152.142316888)):
            Rectangle(SKETCH12_W, SKETCH12_H)
    extrude(amount=BOSS_EXTRUDE8_DEPTH)

    # Sketch13 → Boss-Extrude9 (add)
    with BuildSketch(Plane(origin=(-487.563683395, 0, 0), x_dir=(0, 0, -1), z_dir=(1, 0, 0))):
        with Locations((-15, 153.392316888)):
            Rectangle(SKETCH13_W, SKETCH13_H)
    extrude(amount=BOSS_EXTRUDE9_DEPTH)

    # Sketch15 → Boss-Extrude10 (add)
    with BuildSketch(Plane(origin=(-486.063683395, 0, 0), x_dir=(0, 0, -1), z_dir=(1, 0, 0))):
        with Locations((-15, 172.363943123)):
            Rectangle(SKETCH15_W, SKETCH15_H)
    extrude(amount=BOSS_EXTRUDE10_DEPTH)

    # Sketch22 → Boss-Extrude15 (add)
    with BuildSketch(Plane(origin=(-486.063683395, 0, 0), x_dir=(0, 0, -1), z_dir=(1, 0, 0))):
        with Locations(Location((-15, 153.392316887, 0), (0, 0, 90))):
            Circle(SKETCH22_R)
    extrude(amount=-BOSS_EXTRUDE15_DEPTH)


solid = Compound([part.part, body_2.part])
